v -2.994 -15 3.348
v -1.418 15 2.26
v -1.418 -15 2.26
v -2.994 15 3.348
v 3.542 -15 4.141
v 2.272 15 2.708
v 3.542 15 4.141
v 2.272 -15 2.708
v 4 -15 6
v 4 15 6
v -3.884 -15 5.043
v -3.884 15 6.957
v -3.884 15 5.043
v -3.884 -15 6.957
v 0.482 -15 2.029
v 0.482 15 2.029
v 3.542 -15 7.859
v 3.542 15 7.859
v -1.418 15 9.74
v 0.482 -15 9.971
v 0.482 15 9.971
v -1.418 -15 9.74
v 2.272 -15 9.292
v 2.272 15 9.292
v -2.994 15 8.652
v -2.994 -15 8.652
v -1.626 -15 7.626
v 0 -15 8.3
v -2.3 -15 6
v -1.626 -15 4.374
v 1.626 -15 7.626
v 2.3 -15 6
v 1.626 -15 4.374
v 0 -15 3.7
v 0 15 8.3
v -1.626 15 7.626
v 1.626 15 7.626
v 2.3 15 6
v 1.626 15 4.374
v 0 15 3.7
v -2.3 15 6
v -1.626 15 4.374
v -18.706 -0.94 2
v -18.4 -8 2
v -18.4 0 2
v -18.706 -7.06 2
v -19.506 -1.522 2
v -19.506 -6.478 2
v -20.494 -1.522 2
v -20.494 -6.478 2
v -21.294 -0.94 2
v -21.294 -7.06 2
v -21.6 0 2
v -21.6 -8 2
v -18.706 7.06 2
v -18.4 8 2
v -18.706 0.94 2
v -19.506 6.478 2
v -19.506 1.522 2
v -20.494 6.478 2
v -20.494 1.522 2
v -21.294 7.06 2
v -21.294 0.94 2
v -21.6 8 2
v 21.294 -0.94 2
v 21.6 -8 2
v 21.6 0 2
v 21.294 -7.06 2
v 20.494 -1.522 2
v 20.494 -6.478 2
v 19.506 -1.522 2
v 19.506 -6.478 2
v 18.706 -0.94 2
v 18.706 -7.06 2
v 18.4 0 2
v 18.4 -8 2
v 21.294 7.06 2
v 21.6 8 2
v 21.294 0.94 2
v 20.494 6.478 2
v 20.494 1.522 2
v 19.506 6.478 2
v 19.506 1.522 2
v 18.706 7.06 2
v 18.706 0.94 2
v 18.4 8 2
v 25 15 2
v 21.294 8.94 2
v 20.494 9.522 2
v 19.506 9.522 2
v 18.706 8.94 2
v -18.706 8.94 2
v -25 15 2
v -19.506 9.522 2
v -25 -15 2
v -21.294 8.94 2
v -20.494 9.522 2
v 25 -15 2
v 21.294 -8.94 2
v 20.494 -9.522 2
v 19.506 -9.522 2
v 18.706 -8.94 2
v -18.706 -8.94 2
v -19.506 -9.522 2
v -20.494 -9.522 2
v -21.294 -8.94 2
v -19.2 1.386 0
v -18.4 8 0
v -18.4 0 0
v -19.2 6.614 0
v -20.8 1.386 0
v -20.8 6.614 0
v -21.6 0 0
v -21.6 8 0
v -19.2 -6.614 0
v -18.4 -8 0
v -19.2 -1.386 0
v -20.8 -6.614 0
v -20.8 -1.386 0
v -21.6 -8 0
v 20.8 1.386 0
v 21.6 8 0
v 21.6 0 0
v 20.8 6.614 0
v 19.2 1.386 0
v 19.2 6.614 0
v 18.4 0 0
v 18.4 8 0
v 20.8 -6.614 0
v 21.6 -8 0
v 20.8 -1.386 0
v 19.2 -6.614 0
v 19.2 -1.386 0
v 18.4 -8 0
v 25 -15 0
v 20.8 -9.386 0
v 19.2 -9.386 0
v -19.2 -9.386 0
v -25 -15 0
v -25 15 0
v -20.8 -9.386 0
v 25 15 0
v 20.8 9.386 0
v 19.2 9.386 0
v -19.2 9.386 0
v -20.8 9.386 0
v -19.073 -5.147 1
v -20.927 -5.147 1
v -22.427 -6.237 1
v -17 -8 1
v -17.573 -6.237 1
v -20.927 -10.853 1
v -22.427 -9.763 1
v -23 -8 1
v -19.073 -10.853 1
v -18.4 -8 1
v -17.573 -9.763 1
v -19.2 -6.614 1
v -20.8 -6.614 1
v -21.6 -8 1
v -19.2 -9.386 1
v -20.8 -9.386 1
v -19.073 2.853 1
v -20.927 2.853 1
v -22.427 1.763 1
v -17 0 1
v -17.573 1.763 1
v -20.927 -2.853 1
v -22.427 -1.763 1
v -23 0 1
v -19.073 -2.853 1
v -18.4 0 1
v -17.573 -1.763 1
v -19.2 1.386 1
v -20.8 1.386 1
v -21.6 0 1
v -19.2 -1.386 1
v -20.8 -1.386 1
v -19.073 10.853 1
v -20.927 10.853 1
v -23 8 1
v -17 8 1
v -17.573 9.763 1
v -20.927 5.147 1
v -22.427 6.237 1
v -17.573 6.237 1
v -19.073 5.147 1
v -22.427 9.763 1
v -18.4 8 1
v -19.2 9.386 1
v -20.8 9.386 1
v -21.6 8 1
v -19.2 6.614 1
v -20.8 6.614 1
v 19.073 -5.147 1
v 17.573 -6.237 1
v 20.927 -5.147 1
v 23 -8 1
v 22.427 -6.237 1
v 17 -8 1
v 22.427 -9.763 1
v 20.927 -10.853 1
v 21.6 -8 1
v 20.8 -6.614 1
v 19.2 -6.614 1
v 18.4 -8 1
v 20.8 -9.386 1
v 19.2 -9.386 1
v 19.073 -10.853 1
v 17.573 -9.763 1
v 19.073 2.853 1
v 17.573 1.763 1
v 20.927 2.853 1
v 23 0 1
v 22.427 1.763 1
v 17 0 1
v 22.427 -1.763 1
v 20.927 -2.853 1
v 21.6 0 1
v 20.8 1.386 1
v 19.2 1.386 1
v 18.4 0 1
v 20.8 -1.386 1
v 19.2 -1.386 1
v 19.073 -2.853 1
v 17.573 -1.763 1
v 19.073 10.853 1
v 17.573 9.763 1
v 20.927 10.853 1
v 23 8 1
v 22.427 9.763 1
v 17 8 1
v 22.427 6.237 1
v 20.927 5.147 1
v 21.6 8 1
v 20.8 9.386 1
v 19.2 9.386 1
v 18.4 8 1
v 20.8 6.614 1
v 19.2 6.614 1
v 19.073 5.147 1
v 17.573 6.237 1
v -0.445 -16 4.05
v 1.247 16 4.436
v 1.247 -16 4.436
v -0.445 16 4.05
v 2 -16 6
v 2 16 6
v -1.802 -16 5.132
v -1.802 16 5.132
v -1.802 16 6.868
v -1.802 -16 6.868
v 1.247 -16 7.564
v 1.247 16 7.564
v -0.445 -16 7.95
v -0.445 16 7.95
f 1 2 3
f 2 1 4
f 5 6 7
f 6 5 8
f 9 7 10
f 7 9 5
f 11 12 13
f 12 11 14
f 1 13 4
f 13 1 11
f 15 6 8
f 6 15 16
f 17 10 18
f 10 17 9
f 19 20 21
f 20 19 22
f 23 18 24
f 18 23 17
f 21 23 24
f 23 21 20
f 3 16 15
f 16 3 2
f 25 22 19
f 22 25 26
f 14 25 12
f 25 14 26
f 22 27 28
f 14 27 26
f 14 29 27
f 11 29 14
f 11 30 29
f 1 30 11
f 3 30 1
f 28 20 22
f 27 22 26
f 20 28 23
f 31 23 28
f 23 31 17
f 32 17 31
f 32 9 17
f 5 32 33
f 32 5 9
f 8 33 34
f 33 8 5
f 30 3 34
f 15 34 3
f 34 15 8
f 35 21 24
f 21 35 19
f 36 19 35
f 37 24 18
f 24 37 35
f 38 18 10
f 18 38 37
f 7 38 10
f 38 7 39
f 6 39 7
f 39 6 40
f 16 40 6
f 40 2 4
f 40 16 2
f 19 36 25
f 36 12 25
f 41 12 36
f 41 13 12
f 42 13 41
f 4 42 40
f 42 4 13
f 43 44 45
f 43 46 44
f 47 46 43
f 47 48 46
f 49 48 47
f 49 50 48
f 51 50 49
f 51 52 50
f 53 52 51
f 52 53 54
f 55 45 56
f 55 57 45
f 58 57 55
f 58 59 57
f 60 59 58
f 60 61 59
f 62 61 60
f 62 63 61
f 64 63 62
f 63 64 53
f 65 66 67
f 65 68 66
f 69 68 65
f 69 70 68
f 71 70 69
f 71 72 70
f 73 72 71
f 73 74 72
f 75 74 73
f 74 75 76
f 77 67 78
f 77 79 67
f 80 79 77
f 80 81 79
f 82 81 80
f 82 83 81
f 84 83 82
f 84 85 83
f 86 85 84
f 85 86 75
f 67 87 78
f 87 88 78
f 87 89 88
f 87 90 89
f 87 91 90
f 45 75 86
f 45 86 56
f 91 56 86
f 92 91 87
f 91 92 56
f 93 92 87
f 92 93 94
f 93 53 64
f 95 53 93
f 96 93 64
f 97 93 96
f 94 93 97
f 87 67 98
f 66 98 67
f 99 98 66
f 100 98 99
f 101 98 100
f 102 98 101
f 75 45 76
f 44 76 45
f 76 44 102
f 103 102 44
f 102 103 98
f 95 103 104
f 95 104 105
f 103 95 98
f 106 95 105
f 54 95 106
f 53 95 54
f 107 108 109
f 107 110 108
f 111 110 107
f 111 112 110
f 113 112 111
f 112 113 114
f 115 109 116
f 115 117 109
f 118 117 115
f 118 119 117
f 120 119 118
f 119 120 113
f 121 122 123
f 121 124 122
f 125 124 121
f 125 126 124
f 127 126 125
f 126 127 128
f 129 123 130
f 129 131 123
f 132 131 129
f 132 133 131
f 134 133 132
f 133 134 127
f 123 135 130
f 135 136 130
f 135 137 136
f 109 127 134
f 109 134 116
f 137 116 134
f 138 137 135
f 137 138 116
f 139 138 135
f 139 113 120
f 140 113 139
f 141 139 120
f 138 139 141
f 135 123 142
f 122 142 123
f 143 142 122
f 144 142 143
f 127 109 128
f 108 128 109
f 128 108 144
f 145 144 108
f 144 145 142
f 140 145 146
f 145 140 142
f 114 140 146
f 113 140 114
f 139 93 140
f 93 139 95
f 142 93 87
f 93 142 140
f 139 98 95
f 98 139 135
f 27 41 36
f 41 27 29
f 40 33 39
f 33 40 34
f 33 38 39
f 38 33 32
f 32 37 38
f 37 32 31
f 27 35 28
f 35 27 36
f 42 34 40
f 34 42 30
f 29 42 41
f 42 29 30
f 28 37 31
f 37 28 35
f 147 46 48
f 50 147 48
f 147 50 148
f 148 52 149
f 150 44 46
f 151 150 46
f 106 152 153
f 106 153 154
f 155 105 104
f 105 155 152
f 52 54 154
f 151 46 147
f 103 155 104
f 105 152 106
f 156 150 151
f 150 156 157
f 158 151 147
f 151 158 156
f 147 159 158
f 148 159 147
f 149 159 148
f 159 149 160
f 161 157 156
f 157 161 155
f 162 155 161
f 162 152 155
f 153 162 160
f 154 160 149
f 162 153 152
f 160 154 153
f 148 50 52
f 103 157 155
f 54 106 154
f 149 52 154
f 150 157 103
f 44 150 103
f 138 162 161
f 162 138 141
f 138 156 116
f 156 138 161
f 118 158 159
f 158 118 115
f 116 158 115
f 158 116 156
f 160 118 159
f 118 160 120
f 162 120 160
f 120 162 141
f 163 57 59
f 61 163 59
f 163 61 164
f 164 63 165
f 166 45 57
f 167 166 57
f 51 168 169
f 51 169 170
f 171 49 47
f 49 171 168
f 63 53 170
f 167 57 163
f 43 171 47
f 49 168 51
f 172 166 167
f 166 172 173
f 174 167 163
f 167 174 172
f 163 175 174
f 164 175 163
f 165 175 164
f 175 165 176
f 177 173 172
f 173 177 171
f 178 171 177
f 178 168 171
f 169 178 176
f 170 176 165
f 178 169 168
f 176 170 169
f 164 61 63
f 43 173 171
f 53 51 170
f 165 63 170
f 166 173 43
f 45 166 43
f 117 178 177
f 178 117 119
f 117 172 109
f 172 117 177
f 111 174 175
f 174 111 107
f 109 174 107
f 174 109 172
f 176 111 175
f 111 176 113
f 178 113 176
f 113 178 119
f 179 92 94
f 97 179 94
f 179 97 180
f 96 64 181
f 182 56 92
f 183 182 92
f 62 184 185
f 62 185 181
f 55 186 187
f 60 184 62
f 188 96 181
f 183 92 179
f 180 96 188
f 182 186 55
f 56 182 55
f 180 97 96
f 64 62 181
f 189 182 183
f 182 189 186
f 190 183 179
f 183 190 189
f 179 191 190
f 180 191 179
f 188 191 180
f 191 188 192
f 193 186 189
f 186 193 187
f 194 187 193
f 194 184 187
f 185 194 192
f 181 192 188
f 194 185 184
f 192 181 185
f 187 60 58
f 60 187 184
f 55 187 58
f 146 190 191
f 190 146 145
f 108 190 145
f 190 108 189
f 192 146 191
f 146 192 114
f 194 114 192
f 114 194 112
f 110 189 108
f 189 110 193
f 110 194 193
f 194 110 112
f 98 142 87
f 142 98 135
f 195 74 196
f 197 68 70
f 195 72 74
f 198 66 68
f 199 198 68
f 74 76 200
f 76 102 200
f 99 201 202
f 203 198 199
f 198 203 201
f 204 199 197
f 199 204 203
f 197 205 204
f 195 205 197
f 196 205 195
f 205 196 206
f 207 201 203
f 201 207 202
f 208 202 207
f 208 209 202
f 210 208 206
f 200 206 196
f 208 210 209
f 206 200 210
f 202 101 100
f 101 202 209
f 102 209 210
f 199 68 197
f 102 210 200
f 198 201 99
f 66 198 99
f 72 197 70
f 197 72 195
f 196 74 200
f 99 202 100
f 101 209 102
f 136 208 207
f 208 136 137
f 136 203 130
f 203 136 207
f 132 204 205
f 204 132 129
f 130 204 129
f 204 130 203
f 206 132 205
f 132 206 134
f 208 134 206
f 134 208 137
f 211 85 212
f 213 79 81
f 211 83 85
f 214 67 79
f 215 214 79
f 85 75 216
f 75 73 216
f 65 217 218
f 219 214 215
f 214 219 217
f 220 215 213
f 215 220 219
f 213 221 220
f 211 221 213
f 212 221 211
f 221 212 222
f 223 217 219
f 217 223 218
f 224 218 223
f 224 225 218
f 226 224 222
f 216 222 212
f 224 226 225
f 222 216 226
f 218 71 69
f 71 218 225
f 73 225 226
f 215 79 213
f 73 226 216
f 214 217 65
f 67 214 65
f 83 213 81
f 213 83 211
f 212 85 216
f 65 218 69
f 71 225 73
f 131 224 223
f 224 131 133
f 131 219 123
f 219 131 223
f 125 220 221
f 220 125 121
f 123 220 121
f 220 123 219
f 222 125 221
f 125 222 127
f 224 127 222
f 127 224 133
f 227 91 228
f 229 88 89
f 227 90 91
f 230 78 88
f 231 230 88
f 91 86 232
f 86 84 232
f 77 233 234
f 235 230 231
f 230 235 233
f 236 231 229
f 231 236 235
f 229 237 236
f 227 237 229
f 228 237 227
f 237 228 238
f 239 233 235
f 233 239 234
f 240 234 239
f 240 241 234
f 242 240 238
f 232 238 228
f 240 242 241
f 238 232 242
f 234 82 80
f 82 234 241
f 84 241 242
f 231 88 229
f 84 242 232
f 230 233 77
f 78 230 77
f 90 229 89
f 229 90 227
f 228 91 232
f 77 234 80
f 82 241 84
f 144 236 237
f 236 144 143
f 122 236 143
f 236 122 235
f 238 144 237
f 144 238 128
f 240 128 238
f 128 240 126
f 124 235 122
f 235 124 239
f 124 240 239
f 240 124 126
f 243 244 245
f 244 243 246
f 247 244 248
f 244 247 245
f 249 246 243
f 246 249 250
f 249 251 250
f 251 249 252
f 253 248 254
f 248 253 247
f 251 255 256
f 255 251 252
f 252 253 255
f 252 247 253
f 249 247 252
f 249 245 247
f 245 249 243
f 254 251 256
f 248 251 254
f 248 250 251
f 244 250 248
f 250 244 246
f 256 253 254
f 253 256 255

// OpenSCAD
// Small butt hinge in open 180° configuration

module leaf(side=1) {
  // side = -1 for left leaf, +1 for right leaf
  difference() {
    union() {
      // leaf plate
      translate([ side == 1 ? 0 : -25, -15, 0 ])
        cube([25, 30, 2]);
      // knuckle barrels (outer)
      for (ypt = side == 1 ? [-6, 6] : [-12, 0, 12]) {
        translate([0, ypt, 6])
          rotate([-90, 0, 0])
            cylinder(h=6, r=4, center=true);
      }
    }
    // knuckle barrel inner holes
    for (ypt = side == 1 ? [-6, 6] : [-12, 0, 12]) {
      translate([0, ypt, 6])
        rotate([-90, 0, 0])
          cylinder(h=6, r=2.3, center=true);
    }
    // M3 countersunk screw holes
    for (ypt = [-8, 0, 8]) {
      // countersink: 6mm dia → 3.2mm dia over 1mm depth
      translate([side*20, ypt, 1])
        cylinder(h=1, r1=3, r2=1.6, center=false);
      // through hole 3.2mm dia
      translate([side*20, ypt, 0])
        cylinder(h=1, r=1.6, center=false);
    }
  }
}

// left leaf (x<0)
leaf(-1);
// right leaf (x>0)
leaf(1);

// hinge pin
translate([0, 0, 6])
  rotate([-90, 0, 0])
    cylinder(h=32, r=2, center=true);
